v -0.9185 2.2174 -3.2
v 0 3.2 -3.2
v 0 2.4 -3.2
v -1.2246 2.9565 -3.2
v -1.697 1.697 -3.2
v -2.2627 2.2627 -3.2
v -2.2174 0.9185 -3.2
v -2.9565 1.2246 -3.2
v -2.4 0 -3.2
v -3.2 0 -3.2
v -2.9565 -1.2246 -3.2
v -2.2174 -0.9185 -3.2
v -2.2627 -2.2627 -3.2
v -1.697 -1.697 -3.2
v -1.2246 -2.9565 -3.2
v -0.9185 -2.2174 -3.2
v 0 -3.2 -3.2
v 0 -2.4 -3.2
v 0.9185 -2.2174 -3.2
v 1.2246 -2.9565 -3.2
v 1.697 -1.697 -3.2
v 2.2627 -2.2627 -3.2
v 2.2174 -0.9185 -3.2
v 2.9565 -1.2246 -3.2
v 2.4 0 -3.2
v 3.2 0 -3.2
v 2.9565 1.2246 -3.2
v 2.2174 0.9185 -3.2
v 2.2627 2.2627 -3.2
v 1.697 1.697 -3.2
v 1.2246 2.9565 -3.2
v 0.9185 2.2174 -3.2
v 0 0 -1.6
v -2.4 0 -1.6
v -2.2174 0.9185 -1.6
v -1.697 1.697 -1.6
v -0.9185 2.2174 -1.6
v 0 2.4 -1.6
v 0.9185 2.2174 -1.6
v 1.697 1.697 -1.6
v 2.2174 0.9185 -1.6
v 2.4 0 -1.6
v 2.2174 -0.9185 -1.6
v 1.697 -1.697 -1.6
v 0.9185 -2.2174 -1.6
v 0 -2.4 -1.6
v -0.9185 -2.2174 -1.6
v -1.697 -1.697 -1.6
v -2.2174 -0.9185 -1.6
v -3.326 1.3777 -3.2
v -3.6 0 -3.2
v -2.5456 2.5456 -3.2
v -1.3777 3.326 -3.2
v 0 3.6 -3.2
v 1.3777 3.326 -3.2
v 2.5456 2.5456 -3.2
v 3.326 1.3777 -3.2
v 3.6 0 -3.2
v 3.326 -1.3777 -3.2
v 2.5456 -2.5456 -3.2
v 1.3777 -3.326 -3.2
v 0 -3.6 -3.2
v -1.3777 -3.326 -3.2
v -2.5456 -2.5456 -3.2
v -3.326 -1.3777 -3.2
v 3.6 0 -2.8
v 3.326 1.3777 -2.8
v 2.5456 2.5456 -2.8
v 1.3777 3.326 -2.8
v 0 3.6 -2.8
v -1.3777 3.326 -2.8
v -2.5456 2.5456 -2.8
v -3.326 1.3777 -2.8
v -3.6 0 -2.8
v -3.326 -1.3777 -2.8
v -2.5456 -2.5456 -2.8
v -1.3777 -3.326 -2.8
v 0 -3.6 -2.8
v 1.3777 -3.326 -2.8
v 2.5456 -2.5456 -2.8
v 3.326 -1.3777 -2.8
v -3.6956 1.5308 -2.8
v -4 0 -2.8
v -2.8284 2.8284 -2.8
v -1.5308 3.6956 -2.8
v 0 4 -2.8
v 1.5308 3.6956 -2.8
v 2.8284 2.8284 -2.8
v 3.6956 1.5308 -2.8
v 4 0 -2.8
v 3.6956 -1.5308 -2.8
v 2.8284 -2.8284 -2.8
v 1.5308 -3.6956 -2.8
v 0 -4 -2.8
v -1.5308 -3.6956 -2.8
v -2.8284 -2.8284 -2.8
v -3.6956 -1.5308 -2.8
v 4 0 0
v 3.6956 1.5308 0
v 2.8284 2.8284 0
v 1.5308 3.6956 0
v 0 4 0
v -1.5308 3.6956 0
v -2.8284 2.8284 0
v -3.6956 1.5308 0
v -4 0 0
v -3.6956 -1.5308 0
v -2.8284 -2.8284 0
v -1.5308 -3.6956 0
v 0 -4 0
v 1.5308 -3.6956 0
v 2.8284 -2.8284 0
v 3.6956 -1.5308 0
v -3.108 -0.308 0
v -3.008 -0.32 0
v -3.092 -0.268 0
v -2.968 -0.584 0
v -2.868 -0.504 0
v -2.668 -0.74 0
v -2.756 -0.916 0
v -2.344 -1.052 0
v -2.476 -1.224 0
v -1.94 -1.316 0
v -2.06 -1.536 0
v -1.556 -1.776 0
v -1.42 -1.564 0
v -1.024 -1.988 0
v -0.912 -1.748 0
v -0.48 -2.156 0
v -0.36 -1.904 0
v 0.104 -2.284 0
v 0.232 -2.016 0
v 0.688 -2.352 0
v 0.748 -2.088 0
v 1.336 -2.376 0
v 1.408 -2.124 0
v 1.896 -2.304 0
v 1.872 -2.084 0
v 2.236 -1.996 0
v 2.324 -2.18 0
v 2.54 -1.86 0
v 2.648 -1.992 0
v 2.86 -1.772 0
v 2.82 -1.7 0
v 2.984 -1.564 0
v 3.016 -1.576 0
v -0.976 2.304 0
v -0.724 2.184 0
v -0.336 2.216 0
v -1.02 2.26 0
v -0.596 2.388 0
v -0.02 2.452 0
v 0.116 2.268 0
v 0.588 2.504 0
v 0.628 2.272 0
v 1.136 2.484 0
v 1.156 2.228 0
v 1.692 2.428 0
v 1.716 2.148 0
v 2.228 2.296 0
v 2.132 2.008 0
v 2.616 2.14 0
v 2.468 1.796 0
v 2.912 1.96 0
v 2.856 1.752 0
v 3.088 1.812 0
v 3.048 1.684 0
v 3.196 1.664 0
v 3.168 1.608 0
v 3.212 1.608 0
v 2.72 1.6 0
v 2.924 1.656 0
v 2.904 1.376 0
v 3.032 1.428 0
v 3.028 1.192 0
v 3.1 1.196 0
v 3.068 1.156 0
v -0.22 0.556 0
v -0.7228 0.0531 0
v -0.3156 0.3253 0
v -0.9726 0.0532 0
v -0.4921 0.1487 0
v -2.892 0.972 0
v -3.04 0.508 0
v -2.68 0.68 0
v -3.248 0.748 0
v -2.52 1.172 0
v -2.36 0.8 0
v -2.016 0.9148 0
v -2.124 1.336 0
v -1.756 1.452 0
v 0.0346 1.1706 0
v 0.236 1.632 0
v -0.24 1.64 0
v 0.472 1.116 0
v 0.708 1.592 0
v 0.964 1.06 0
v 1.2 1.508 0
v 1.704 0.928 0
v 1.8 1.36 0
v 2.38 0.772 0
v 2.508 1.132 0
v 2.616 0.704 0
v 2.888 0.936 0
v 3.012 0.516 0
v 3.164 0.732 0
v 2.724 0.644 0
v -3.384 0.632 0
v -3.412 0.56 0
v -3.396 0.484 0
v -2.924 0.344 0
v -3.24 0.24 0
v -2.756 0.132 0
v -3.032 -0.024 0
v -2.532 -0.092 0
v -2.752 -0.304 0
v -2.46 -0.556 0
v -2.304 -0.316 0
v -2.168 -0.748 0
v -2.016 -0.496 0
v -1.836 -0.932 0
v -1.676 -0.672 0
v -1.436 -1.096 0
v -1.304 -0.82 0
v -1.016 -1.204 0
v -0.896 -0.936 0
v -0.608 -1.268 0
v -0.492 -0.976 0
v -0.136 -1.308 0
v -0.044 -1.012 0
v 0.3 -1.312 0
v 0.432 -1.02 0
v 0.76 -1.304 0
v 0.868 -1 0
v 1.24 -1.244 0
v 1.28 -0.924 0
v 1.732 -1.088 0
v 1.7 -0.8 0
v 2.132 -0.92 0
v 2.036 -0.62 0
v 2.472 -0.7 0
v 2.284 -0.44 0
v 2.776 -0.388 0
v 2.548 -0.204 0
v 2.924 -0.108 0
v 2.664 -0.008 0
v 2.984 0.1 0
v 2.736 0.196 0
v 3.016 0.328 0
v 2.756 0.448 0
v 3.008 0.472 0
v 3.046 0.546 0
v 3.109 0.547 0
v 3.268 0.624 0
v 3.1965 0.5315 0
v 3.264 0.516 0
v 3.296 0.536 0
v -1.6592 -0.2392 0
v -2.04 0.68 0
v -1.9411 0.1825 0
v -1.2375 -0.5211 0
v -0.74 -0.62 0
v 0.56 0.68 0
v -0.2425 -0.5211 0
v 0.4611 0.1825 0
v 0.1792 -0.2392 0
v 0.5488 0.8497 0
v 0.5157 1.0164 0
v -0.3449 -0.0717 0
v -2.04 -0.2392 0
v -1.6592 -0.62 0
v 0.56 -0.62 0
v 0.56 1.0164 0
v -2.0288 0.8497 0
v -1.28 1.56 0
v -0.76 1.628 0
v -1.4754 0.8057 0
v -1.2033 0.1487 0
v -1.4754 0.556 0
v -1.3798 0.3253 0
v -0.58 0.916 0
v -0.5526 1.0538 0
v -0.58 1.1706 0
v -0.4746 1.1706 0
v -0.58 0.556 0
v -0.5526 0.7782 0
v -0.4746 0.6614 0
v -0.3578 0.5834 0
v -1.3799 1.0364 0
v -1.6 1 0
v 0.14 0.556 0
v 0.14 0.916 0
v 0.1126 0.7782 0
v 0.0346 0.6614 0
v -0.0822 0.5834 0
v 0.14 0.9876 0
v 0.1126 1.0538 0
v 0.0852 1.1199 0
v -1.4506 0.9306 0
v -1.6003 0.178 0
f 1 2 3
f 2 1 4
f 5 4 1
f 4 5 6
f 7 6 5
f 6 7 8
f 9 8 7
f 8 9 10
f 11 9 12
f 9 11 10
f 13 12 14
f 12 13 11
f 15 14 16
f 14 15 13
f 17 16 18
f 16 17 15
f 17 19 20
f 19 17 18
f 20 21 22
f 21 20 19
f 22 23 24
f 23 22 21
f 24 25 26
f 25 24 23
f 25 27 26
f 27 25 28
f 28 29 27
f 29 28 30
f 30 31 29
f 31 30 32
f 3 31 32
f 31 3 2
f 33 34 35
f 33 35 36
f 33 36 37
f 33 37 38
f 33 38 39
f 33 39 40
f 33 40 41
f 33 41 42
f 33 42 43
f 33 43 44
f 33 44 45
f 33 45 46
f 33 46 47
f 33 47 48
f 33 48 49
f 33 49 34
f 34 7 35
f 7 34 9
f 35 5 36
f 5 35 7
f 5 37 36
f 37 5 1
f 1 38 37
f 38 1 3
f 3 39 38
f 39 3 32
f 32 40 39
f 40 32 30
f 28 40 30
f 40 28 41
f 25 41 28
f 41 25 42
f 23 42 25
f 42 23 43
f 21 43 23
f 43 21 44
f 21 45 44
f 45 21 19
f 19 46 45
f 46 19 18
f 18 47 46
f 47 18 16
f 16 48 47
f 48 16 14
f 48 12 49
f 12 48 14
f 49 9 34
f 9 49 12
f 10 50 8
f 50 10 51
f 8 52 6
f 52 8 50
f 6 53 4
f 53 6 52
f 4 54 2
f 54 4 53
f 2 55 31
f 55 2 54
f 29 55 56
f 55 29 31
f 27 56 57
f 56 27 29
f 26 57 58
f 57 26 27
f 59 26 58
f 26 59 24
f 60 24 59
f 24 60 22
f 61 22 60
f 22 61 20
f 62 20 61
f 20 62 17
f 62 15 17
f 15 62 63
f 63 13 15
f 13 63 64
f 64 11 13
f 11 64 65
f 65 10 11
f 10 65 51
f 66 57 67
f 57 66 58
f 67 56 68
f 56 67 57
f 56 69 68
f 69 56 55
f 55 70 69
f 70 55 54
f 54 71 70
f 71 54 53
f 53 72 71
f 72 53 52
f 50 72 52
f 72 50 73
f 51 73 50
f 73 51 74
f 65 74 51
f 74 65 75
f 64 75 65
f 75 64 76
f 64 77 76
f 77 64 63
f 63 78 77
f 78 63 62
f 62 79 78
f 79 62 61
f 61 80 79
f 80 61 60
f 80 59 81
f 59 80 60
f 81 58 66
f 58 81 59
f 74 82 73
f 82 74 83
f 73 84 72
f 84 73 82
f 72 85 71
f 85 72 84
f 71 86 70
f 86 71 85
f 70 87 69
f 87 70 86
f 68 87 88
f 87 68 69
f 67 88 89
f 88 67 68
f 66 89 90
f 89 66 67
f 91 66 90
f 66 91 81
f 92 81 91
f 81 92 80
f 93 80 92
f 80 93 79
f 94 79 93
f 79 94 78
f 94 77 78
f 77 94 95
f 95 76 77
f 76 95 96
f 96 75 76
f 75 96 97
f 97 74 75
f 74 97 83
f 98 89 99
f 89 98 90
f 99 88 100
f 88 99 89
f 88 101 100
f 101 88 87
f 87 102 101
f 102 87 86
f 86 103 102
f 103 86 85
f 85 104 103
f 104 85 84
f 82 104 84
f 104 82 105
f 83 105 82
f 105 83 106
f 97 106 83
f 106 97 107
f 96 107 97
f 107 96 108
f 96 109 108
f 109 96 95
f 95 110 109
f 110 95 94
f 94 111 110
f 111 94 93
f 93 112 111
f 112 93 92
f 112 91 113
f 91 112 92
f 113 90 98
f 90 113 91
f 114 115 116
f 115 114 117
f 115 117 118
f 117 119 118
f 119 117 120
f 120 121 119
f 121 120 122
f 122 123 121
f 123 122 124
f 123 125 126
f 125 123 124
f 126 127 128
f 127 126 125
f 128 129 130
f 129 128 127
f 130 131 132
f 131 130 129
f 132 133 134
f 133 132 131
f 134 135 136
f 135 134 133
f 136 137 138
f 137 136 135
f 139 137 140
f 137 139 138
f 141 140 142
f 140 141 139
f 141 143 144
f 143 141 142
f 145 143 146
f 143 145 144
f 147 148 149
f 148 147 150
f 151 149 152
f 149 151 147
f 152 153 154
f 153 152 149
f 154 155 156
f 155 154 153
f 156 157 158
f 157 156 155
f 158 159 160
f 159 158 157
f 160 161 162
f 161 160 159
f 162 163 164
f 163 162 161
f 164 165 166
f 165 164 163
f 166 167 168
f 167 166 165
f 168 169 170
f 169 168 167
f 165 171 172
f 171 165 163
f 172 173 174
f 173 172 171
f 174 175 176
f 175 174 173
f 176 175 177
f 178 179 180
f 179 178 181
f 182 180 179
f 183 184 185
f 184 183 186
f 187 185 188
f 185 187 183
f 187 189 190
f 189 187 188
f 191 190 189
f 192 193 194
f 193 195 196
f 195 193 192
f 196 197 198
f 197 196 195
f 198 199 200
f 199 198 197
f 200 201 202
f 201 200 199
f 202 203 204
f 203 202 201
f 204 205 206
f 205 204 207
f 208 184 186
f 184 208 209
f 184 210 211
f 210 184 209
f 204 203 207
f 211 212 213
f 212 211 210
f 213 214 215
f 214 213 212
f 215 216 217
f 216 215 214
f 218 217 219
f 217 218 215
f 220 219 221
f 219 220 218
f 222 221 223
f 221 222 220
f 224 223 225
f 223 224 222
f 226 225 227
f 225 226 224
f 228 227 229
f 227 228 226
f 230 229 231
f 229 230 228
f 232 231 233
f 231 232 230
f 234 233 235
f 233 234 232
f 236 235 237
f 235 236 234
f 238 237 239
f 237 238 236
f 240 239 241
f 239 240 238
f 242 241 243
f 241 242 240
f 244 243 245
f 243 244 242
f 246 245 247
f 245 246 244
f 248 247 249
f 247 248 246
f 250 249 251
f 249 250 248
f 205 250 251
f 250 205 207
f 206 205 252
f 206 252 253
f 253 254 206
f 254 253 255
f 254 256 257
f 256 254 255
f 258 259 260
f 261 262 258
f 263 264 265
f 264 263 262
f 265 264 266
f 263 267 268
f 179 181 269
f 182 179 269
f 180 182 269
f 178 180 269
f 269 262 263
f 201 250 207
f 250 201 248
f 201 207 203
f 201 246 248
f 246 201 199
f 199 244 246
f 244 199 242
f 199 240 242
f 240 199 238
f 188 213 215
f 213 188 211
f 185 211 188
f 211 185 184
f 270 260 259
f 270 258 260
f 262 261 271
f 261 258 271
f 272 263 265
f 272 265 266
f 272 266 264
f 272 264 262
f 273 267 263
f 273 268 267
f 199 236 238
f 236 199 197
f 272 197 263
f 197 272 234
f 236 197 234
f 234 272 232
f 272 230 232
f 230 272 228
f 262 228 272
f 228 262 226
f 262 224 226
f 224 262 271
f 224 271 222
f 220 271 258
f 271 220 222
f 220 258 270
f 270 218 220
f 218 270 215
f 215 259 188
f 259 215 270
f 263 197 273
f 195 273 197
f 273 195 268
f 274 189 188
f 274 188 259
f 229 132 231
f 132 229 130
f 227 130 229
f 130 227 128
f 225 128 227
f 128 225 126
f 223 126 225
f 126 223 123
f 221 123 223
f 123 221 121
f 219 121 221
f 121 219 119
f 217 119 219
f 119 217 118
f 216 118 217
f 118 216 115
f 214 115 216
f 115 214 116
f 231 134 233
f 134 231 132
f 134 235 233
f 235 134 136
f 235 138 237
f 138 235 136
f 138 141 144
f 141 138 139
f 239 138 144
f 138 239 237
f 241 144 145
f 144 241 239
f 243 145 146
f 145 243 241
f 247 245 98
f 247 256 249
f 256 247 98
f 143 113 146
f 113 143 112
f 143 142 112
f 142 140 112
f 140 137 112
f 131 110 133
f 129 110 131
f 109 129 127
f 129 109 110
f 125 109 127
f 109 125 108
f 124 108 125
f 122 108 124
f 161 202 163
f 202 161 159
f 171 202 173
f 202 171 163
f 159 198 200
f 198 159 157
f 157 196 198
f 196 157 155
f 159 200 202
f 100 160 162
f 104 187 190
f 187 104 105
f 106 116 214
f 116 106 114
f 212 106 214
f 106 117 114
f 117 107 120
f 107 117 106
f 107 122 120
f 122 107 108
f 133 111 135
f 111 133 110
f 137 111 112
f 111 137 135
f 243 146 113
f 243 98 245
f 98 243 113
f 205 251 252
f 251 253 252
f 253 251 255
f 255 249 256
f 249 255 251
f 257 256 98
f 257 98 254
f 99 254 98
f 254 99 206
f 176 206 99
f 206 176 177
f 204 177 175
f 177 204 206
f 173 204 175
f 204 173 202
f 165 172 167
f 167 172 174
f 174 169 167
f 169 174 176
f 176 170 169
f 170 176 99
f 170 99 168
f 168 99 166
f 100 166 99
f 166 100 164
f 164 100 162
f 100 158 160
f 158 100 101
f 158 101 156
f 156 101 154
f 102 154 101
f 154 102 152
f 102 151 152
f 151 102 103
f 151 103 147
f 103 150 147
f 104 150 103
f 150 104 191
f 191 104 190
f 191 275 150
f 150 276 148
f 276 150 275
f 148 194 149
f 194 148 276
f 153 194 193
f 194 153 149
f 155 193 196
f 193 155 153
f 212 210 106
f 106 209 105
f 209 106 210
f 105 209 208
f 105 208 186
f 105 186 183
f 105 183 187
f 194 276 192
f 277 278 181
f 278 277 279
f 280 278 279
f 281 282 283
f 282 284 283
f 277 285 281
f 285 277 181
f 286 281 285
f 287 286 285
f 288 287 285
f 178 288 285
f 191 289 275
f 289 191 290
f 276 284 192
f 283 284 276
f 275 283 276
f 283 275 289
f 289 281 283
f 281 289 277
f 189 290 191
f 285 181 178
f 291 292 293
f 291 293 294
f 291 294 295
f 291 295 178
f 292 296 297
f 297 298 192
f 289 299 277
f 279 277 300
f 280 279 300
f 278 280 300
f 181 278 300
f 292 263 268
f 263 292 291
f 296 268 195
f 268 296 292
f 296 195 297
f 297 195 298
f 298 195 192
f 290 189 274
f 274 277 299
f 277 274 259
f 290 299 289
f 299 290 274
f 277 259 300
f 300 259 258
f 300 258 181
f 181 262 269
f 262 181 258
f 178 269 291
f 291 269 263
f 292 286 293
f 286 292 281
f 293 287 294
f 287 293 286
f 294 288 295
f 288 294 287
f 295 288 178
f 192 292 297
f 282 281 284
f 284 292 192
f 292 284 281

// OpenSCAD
use <../lib.scad>
use <../p/1-16chrd.scad>
use <../p/1-16tang.scad>
use <../p/1-4chrd.scad>
use <../p/1-4ndis.scad>
use <../p/1-8chrd.scad>
use <../p/1-8tang.scad>
use <../p/1-8tndis.scad>
use <../p/2-4chrd.scad>
use <s/98138pxls01.scad>
use <s/98138s02.scad>
function ldraw_lib__98138pxl() = [
// 0 Tile  1 x  1 Round with Squinting Eye with Medium Blue Iris and Medium Nougat Wrinkles Left Pattern
// 0 Name: 98138pxl.dat
// 0 Author: Gerald Lasser [GeraldLasser]
// 0 !LDRAW_ORG Part UPDATE 2025-07
// 0 !LICENSE Licensed under CC BY 4.0 : see CAreadme.txt
// 
// 0 BFC CERTIFY CCW
  [0,"BFC","CERTIFY"],
  [0,"BFC","CCW"],
// 
// 0 !KEYWORDS Bricklink 98138pb414L, Despicable Me, Gru, Minions
// 0 !KEYWORDS Rebrickable 98138pr0396, Set 75582
// 
// 0 !HISTORY 2025-07-27 [OrionP] Official Update 2025-07
// 
// 1 16 0 0 0 1 0 0 0 1 0 0 0 1 s\98138s02.dat
  [1,16,0,0,0,1,0,0,0,1,0,0,0,1, ldraw_lib__s__98138s02()],
// 1 16 0 0 0 1 0 0 0 1 0 0 0 1 s\98138pxls01.dat
  [1,16,0,0,0,1,0,0,0,1,0,0,0,1, ldraw_lib__s__98138pxls01()],
// 
// 1 0 -2.11926 0 1.70214 -1.56926 0 .31214 0 1 0 .31214 0 1.56926 1-16chrd.dat
  [1,0,-2.11926,0,1.70214,-1.56926,0,.31214,0,1,0,.31214,0,1.56926, ldraw_lib__1_16chrd()],
// 1 0 -2.11926 0 1.70214 -1.56926 0 -.31214 0 1 0 .31214 0 -1.56926 1-4chrd.dat
  [1,0,-2.11926,0,1.70214,-1.56926,0,-.31214,0,1,0,.31214,0,-1.56926, ldraw_lib__1_4chrd()],
// 1 0 -.55 0 2.29 -.9 0 0 0 1 0 0 0 .9 1-8tndis.dat
  [1,0,-.55,0,2.29,-.9,0,0,0,1,0,0,0,.9, ldraw_lib__1_8tndis()],
// 4 0 -2.4314 0 .13288 -1.45 0 1.39 -1.45 0 2.29 -3.68852 0 2.01428
  [4,0,-2.4314,0,.13288,-1.45,0,1.39,-1.45,0,2.29,-3.68852,0,2.01428],
// 1 0 -.55 0 2.29 -.9 0 0 0 1 0 0 0 -.9 1-4ndis.dat
  [1,0,-.55,0,2.29,-.9,0,0,0,1,0,0,0,-.9, ldraw_lib__1_4ndis()],
// 4 0 -3.2 0 3.9 -4.39 0 3.63 -4 0 2.5 -3.44964 0 2.59108
  [4,0,-3.2,0,3.9,-4.39,0,3.63,-4,0,2.5,-3.44964,0,2.59108],
// 3 0 -1.9 0 4.07 -1.18639 0 2.92639 .08639 0 2.92639
  [3,0,-1.9,0,4.07,-1.18639,0,2.92639,.08639,0,2.92639],
// 3 0 -1.45 0 2.92639 -1.18639 0 2.92639 -1.9 0 4.07
  [3,0,-1.45,0,2.92639,-1.18639,0,2.92639,-1.9,0,4.07],
// 4 0 -1.9 0 4.07 -3.2 0 3.9 -3.44964 0 2.59108 -1.45 0 2.92639
  [4,0,-1.9,0,4.07,-3.2,0,3.9,-3.44964,0,2.59108,-1.45,0,2.92639],
// 4 0 -1.45 0 2.92639 -3.44964 0 2.59108 -3.68852 0 2.01428 -1.45 0 2.29
  [4,0,-1.45,0,2.92639,-3.44964,0,2.59108,-3.68852,0,2.01428,-1.45,0,2.29],
// 3 0 -5.04 0 2.287 -4 0 2.5 -4.39 0 3.63
  [3,0,-5.04,0,2.287,-4,0,2.5,-4.39,0,3.63],
// 3 0 -1.45 0 1.39 -2.4314 0 .13288 -.55 0 1.39
  [3,0,-1.45,0,1.39,-2.4314,0,.13288,-.55,0,1.39],
// 
// 1 73 -.55 0 2.29 .9 0 0 0 1 0 0 0 -.9 1-4ndis.dat
  [1,73,-.55,0,2.29,.9,0,0,0,1,0,0,0,-.9, ldraw_lib__1_4ndis()],
// 1 73 -.55 0 2.29 .9 0 0 0 1 0 0 0 .9 1-8tang.dat
  [1,73,-.55,0,2.29,.9,0,0,0,1,0,0,0,.9, ldraw_lib__1_8tang()],
// 1 73 -2.11926 0 1.70214 -1.56926 0 .31214 0 1 0 .31214 0 1.56926 1-16tang.dat
  [1,73,-2.11926,0,1.70214,-1.56926,0,.31214,0,1,0,.31214,0,1.56926, ldraw_lib__1_16tang()],
// 1 73 -2.11926 0 1.70214 -1.56926 0 -.31214 0 1 0 .31214 0 -1.56926 1-4ndis.dat
  [1,73,-2.11926,0,1.70214,-1.56926,0,-.31214,0,1,0,.31214,0,-1.56926, ldraw_lib__1_4ndis()],
// 4 73 1.28918 0 2.5411 .35 0 2.29 .35 0 1.39 1.4 0 1.7
  [4,73,1.28918,0,2.5411,.35,0,2.29,.35,0,1.39,1.4,0,1.7],
// 4 73 .35 0 2.46901 .35 0 2.29 1.28918 0 2.5411 1.18 0 2.79
  [4,73,.35,0,2.46901,.35,0,2.29,1.28918,0,2.5411,1.18,0,2.79],
// 3 73 .35 0 2.46901 1.18 0 2.79 .28151 0 2.63443
  [3,73,.35,0,2.46901,1.18,0,2.79,.28151,0,2.63443],
// 3 73 .28151 0 2.63443 1.18 0 2.79 .21302 0 2.79985
  [3,73,.28151,0,2.63443,1.18,0,2.79,.21302,0,2.79985],
// 3 73 .21302 0 2.79985 1.18 0 2.79 .08639 0 2.92639
  [3,73,.21302,0,2.79985,1.18,0,2.79,.08639,0,2.92639],
// 3 73 -4 0 2.5 -5.04 0 2.287 -5.07205 0 2.12413
  [3,73,-4,0,2.5,-5.04,0,2.287,-5.07205,0,2.12413],
// 4 73 -5.1 0 1.7 -3.68852 0 2.01428 -3.62644 0 2.32641 -5.07205 0 2.12413
  [4,73,-5.1,0,1.7,-3.68852,0,2.01428,-3.62644,0,2.32641,-5.07205,0,2.12413],
// 4 73 -3.44964 0 2.59108 -4 0 2.5 -5.07205 0 2.12413 -3.62644 0 2.32641
  [4,73,-3.44964,0,2.59108,-4,0,2.5,-5.07205,0,2.12413,-3.62644,0,2.32641],
// 3 73 -3.68852 0 2.01428 -5.1 0 1.7 -4.00066 0 .44502
  [3,73,-3.68852,0,2.01428,-5.1,0,1.7,-4.00066,0,.44502],
// 3 73 -4.00066 0 .44502 -5.1 0 1.7 -4.14808 0 -.59808
  [3,73,-4.00066,0,.44502,-5.1,0,1.7,-4.14808,0,-.59808],
// 3 73 -4.00066 0 .44502 -4.14808 0 -.59808 -2.4314 0 .13288
  [3,73,-4.00066,0,.44502,-4.14808,0,-.59808,-2.4314,0,.13288],
// 4 73 -.86214 0 -.17926 -2.4314 0 .13288 -4.14808 0 -.59808 -1.85 0 -1.55
  [4,73,-.86214,0,-.17926,-2.4314,0,.13288,-4.14808,0,-.59808,-1.85,0,-1.55],
// 3 73 -.55 0 1.39 -.86214 0 -.17926 .35 0 1.39
  [3,73,-.55,0,1.39,-.86214,0,-.17926,.35,0,1.39],
// 3 73 .35 0 1.39 -.86214 0 -.17926 1.4 0 1.7
  [3,73,.35,0,1.39,-.86214,0,-.17926,1.4,0,1.7],
// 
// 1 15 -.55 0 2.29 .9 0 0 0 1 0 0 0 -.9 2-4chrd.dat
  [1,15,-.55,0,2.29,.9,0,0,0,1,0,0,0,-.9, ldraw_lib__2_4chrd()],
// 1 15 -.55 0 2.29 .9 0 0 0 1 0 0 0 .9 1-8chrd.dat
  [1,15,-.55,0,2.29,.9,0,0,0,1,0,0,0,.9, ldraw_lib__1_8chrd()],
// 1 15 -.55 0 2.29 -.9 0 0 0 1 0 0 0 .9 1-8chrd.dat
  [1,15,-.55,0,2.29,-.9,0,0,0,1,0,0,0,.9, ldraw_lib__1_8chrd()],
// 4 15 .08639 0 2.92639 -1.18639 0 2.92639 -1.45 0 2.29 .35 0 2.29
  [4,15,.08639,0,2.92639,-1.18639,0,2.92639,-1.45,0,2.29,.35,0,2.29],
];
module ldraw_lib__98138pxl(step=0, col=false, unit=2/5, alt=false, line=0.2, solid=!$preview)
    makepoly(ldraw_lib__98138pxl(), step=step, col=col, unit=unit, alt=alt, line=line, solid=solid);
ldraw_lib__98138pxl(line=0.2);
